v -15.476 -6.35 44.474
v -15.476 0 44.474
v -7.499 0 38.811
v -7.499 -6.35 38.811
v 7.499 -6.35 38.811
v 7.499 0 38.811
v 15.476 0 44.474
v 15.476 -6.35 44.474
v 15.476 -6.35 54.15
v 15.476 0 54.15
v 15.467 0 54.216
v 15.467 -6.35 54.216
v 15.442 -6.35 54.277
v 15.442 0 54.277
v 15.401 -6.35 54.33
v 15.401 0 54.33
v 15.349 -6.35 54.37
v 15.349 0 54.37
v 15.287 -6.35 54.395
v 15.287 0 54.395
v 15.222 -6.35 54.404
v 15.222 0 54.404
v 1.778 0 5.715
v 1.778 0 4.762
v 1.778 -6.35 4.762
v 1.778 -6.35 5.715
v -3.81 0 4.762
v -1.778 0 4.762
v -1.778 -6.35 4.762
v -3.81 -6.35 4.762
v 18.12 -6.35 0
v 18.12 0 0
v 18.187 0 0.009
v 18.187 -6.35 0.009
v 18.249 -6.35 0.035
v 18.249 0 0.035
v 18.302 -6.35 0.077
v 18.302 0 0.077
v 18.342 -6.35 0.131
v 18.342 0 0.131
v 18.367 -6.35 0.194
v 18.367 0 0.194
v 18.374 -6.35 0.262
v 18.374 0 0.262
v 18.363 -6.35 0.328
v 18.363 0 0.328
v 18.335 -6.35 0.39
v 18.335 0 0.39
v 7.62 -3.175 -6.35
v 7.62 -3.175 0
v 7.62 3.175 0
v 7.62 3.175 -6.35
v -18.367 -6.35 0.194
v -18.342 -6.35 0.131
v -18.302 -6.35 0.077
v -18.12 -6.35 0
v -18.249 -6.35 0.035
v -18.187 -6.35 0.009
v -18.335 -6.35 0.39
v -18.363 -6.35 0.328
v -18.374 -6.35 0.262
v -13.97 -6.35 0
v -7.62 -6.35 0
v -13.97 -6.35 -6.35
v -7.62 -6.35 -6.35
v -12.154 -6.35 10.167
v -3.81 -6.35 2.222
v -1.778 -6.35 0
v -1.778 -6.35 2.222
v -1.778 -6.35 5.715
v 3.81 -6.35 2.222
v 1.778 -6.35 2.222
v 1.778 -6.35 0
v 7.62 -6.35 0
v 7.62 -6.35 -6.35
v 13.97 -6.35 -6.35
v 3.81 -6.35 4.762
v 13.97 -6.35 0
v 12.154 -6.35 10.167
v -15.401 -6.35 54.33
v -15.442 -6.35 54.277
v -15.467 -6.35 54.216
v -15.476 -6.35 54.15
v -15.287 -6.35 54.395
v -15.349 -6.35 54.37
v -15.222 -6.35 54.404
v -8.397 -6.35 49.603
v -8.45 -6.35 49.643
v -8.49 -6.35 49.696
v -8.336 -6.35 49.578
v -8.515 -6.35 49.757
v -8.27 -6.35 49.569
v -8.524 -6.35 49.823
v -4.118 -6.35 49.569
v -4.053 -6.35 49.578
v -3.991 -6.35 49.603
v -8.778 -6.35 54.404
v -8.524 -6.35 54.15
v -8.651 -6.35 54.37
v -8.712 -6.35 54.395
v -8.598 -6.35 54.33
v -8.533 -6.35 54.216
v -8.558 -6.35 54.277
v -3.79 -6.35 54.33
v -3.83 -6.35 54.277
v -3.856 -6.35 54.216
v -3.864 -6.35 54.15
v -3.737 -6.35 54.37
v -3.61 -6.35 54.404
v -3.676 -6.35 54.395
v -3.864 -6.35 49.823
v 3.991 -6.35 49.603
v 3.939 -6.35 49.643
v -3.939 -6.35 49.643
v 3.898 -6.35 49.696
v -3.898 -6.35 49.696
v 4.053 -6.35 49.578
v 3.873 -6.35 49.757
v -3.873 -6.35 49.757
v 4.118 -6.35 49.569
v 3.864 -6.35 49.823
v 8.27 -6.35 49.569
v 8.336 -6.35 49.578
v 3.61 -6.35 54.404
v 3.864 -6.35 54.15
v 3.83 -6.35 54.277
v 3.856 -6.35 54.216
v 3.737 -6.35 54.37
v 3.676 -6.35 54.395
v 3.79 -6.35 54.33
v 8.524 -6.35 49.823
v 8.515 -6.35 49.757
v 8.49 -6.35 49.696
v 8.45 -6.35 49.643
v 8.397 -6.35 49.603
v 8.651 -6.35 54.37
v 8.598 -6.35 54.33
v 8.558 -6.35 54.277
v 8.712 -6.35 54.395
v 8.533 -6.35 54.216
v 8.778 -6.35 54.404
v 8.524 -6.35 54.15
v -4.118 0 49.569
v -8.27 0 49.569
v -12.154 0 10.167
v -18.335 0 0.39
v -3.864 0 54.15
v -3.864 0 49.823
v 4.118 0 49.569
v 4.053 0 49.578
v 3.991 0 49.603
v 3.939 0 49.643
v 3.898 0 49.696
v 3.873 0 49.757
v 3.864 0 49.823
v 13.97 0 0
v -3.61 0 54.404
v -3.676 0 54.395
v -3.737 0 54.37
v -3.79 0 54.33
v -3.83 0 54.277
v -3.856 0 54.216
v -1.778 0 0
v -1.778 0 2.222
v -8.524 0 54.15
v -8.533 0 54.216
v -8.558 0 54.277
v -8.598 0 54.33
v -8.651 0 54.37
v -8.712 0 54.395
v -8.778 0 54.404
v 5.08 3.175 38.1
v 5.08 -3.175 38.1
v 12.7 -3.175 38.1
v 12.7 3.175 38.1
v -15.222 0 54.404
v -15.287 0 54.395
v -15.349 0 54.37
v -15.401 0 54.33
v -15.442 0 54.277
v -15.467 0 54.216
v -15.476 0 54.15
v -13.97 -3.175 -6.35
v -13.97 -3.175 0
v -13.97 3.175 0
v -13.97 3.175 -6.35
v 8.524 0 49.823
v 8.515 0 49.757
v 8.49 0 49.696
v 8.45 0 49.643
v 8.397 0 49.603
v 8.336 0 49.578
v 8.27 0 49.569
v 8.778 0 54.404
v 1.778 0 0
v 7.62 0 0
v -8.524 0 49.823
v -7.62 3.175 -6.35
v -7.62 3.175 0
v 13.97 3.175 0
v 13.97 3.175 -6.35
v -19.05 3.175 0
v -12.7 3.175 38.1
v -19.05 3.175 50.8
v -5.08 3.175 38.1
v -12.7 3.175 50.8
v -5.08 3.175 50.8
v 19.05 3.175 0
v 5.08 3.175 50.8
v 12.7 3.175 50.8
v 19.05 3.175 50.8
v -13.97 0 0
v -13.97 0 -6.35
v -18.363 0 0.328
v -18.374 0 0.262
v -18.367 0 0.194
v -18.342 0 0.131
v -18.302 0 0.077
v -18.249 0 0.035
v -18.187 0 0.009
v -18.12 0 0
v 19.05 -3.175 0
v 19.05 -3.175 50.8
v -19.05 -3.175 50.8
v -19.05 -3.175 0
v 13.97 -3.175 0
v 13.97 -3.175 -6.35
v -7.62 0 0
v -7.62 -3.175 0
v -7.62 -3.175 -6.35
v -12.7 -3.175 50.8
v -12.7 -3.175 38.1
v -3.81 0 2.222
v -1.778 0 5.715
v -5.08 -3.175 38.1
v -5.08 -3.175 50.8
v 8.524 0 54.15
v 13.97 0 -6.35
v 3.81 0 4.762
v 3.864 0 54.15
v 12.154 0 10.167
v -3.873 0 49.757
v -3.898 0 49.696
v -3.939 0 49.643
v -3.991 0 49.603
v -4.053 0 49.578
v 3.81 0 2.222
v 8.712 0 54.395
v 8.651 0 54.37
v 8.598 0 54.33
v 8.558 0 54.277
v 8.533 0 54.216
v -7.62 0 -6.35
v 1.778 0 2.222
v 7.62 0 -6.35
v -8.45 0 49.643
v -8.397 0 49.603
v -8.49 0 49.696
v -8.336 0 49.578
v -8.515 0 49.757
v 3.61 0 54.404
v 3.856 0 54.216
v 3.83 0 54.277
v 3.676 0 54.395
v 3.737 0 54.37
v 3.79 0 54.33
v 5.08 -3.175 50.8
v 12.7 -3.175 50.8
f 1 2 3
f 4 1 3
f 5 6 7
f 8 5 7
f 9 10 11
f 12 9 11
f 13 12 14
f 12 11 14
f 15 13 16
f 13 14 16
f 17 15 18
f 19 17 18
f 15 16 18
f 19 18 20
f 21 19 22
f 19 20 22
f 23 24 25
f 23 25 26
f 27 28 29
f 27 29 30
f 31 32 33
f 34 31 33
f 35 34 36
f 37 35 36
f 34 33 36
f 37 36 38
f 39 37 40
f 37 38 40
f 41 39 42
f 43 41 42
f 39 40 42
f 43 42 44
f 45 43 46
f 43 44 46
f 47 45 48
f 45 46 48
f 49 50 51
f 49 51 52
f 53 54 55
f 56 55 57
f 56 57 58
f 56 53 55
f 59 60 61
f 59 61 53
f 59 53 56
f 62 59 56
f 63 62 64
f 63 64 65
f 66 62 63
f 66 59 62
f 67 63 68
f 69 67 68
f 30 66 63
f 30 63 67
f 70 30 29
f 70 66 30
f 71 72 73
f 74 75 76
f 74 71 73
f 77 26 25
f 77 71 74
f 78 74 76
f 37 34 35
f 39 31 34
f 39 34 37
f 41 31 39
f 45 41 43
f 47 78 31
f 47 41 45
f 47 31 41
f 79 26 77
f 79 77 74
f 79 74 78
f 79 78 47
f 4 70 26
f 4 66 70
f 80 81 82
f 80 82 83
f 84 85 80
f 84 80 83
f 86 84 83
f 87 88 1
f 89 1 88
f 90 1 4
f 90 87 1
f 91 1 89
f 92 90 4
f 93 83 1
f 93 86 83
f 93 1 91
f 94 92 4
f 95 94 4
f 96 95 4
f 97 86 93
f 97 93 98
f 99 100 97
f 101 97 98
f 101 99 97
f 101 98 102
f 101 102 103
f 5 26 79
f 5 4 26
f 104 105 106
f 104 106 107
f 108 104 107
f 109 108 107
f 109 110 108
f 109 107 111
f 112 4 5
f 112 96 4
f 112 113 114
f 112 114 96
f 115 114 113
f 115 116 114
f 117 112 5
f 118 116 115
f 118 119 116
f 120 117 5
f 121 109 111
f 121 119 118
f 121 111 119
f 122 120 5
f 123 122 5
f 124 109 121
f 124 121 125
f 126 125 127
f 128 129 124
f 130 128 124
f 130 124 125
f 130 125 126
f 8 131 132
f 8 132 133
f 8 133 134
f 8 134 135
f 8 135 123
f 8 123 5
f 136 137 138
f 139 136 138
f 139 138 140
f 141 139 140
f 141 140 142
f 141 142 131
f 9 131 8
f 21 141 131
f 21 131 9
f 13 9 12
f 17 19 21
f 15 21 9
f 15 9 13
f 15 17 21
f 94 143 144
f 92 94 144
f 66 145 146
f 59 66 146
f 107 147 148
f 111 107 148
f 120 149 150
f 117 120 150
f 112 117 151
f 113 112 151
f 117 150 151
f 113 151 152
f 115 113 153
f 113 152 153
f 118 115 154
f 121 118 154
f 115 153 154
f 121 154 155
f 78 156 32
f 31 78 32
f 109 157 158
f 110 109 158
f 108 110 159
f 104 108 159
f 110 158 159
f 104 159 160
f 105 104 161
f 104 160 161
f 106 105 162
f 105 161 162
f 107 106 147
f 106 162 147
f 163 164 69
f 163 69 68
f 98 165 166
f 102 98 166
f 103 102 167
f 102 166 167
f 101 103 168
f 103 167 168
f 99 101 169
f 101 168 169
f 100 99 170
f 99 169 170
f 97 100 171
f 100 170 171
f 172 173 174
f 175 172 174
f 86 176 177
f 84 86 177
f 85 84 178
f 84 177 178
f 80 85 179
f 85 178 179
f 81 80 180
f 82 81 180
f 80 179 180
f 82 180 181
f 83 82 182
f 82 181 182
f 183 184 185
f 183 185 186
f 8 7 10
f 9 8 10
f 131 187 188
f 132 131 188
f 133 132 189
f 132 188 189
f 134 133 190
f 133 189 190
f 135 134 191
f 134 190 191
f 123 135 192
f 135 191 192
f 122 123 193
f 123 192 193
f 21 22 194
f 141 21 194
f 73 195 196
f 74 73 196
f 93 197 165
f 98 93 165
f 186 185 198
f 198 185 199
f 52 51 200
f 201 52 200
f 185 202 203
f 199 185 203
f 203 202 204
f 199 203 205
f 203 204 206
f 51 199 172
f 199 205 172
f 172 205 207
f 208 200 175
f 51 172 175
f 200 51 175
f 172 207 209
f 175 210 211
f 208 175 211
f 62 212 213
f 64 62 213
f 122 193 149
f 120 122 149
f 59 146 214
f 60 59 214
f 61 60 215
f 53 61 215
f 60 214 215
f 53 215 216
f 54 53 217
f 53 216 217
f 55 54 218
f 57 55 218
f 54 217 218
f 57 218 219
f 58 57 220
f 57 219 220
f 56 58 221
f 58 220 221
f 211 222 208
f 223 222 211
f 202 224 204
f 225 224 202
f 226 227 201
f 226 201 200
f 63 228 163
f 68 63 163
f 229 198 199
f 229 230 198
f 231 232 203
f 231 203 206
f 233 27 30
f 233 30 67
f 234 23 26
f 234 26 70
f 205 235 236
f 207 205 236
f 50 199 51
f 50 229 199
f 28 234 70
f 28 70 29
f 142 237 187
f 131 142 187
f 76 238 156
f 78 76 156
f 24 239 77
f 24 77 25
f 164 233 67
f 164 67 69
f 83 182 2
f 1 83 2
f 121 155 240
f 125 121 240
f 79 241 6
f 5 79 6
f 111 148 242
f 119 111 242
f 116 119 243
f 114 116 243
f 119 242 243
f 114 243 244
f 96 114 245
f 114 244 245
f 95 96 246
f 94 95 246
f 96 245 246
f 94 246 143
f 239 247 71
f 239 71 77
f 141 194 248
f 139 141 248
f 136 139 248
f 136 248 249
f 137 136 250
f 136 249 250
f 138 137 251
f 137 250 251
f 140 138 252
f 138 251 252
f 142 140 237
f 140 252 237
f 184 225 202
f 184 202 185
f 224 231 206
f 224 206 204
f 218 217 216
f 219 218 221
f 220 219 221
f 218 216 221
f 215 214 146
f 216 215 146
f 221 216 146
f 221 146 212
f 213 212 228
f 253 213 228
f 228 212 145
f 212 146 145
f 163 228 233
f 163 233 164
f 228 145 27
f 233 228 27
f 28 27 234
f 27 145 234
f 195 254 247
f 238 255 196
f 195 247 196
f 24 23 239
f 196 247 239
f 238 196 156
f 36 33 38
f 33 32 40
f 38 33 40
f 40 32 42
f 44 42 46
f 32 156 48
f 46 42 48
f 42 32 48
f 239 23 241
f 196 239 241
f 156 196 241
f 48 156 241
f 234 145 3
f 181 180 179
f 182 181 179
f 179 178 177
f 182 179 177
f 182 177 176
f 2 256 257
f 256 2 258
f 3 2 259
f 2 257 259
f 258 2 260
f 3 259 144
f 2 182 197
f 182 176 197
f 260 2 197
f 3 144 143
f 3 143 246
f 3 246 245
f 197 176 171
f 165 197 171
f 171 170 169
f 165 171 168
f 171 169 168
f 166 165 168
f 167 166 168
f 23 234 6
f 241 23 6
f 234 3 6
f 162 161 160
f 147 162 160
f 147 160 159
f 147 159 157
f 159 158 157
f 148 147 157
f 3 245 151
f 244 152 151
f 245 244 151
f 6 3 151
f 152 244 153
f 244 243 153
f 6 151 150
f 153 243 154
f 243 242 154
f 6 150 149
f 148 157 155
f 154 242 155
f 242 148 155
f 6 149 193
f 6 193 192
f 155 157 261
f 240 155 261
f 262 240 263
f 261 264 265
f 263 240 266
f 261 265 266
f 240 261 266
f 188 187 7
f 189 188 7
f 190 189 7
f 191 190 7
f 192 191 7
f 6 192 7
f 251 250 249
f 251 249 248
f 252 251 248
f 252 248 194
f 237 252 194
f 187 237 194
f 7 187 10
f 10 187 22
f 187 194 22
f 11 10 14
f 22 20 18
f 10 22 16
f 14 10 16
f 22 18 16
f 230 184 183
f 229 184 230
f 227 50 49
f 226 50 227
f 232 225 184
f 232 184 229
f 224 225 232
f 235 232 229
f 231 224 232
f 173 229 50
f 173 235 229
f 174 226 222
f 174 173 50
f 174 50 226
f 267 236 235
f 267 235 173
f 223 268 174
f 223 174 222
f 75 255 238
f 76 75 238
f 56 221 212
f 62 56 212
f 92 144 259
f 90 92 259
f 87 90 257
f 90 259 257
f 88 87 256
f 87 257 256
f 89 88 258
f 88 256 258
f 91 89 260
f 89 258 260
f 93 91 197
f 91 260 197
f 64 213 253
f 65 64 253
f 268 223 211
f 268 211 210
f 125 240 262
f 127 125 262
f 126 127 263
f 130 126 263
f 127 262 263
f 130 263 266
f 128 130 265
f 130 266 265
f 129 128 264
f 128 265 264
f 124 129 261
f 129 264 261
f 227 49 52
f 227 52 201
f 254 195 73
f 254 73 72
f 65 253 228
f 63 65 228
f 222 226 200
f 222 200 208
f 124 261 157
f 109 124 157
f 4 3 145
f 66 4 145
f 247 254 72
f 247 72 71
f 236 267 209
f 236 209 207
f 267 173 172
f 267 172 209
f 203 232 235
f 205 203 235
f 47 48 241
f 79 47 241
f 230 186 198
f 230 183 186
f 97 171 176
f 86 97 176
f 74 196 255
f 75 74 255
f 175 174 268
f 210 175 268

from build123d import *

# Parameters (mm, degrees)
F1_DEPTH      = 3.175
F1_DEPTH_BACK = 3.175
F2_W          = 7.62
F2_H          = 12.7
F3_DEPTH      = 25.4
F5_DEPTH      = 6.35
F7_DEPTH      = 25.4


with BuildPart() as f1:
    # F0 (on Front) → F1 (new body, two sides)
    with BuildSketch(Plane.XZ) as f1_sk:
        Polygon((-7.62, 0), (-6.35, 0), (6.35, 0), (7.62, 0), (7.62, -6.35), (13.97, -6.35), (13.97, 0), (19.05, 0), (19.05, 50.8), (-19.05, 50.8), (-19.05, 0), (-13.97, 0), (-13.97, -6.35), (-7.62, -6.35), align=None)
    extrude(amount=F1_DEPTH)
    extrude(f1_sk.sketch, amount=-F1_DEPTH_BACK)

    # F2 (on face) → F3 (cut)
    with BuildSketch(Plane.XZ.offset(3.175)):
        with Locations((-8.89, 44.45)):
            Rectangle(F2_W, F2_H)
        with Locations((8.89, 44.45)):
            Rectangle(F2_W, F2_H)
    extrude(amount=-F3_DEPTH, mode=Mode.SUBTRACT)


with BuildPart() as f5:
    # F4 (on Front) → F5 (new body)
    with BuildSketch(Plane.XZ):
        with BuildLine():
            ThreePointArc((-18.3346545666, 0.3897204487), (-18.342428457, 0.1314377586), (-18.1199548699, 0))
            Line((-18.1199548699, 0), (-13.97, 0))
            Line((-13.97, 0), (-13.97, -6.35))
            Line((-13.97, -6.35), (-7.62, -6.35))
            Line((-7.62, -6.35), (-7.62, 0))
            Line((-7.62, 0), (7.62, 0))
            Line((7.62, 0), (7.62, -6.35))
            Line((7.62, -6.35), (13.97, -6.35))
            Line((13.97, -6.35), (13.97, 0))
            Line((13.97, 0), (18.1199548699, 0))
            ThreePointArc((18.1199548699, 0), (18.342428457, 0.1314377586), (18.3346545666, 0.3897204487))
            Line((18.3346545666, 0.3897204487), (12.1539290994, 10.167170316))
            Line((12.1539290994, 10.167170316), (7.4985641986, 38.8113629378))
            Line((7.4985641986, 38.8113629378), (15.4756298289, 44.474443851))
            Line((15.4756298289, 44.474443851), (15.4756298289, 54.1500687382))
            ThreePointArc((15.4756298289, 54.1500687382), (15.4012349513, 54.3296738606), (15.2216298289, 54.4040687382))
            Line((15.2216298289, 54.4040687382), (8.7779075124, 54.4040687382))
            ThreePointArc((8.7779075124, 54.4040687382), (8.59830239, 54.3296738606), (8.5239075124, 54.1500687382))
            Line((8.5239075124, 54.1500687382), (8.5239075124, 49.8228915253))
            ThreePointArc((8.5239075124, 49.8228915253), (8.4495126348, 49.6432864028), (8.2699075124, 49.5688915253))
            Line((8.2699075124, 49.5688915253), (4.1183283769, 49.5688915253))
            ThreePointArc((4.1183283769, 49.5688915253), (3.9387232545, 49.6432864028), (3.8643283769, 49.8228915253))
            Line((3.8643283769, 49.8228915253), (3.8643283769, 54.1500687382))
            ThreePointArc((3.8643283769, 54.1500687382), (3.7899334994, 54.3296738606), (3.6103283769, 54.4040687382))
            Line((3.6103283769, 54.4040687382), (0, 54.4040687382))
            Line((0, 54.4040687382), (-3.6103283769, 54.4040687382))
            ThreePointArc((-3.6103283769, 54.4040687382), (-3.7899334994, 54.3296738606), (-3.8643283769, 54.1500687382))
            Line((-3.8643283769, 54.1500687382), (-3.8643283769, 49.8228915253))
            ThreePointArc((-3.8643283769, 49.8228915253), (-3.9387232545, 49.6432864028), (-4.1183283769, 49.5688915253))
            Line((-4.1183283769, 49.5688915253), (-8.2699075124, 49.5688915253))
            ThreePointArc((-8.2699075124, 49.5688915253), (-8.4495126348, 49.6432864028), (-8.5239075124, 49.8228915253))
            Line((-8.5239075124, 49.8228915253), (-8.5239075124, 54.1500687382))
            ThreePointArc((-8.5239075124, 54.1500687382), (-8.59830239, 54.3296738606), (-8.7779075124, 54.4040687382))
            Line((-8.7779075124, 54.4040687382), (-15.2216298289, 54.4040687382))
            ThreePointArc((-15.2216298289, 54.4040687382), (-15.4012349513, 54.3296738606), (-15.4756298289, 54.1500687382))
            Line((-15.4756298289, 54.1500687382), (-15.4756298289, 44.474443851))
            Line((-15.4756298289, 44.474443851), (-7.4985641986, 38.8113629378))
            Line((-7.4985641986, 38.8113629378), (-12.1539290994, 10.167170316))
            Line((-12.1539290994, 10.167170316), (-18.3346545666, 0.3897204487))
        make_face()
    extrude(amount=F5_DEPTH)

    # F6 (on Front) → F7 (cut)
    with BuildSketch(Plane.XZ):
        Polygon((1.778, 5.715), (-1.778, 5.715), (-1.778, 4.7625), (-3.81, 4.7625), (-3.81, 2.2225), (-1.778, 2.2225), (-1.778, 0), (1.778, 0), (1.778, 2.2225), (3.81, 2.2225), (3.81, 4.7625), (1.778, 4.7625), align=None)
    extrude(amount=F7_DEPTH, mode=Mode.SUBTRACT)


solid = Compound([f1.part, f5.part])
